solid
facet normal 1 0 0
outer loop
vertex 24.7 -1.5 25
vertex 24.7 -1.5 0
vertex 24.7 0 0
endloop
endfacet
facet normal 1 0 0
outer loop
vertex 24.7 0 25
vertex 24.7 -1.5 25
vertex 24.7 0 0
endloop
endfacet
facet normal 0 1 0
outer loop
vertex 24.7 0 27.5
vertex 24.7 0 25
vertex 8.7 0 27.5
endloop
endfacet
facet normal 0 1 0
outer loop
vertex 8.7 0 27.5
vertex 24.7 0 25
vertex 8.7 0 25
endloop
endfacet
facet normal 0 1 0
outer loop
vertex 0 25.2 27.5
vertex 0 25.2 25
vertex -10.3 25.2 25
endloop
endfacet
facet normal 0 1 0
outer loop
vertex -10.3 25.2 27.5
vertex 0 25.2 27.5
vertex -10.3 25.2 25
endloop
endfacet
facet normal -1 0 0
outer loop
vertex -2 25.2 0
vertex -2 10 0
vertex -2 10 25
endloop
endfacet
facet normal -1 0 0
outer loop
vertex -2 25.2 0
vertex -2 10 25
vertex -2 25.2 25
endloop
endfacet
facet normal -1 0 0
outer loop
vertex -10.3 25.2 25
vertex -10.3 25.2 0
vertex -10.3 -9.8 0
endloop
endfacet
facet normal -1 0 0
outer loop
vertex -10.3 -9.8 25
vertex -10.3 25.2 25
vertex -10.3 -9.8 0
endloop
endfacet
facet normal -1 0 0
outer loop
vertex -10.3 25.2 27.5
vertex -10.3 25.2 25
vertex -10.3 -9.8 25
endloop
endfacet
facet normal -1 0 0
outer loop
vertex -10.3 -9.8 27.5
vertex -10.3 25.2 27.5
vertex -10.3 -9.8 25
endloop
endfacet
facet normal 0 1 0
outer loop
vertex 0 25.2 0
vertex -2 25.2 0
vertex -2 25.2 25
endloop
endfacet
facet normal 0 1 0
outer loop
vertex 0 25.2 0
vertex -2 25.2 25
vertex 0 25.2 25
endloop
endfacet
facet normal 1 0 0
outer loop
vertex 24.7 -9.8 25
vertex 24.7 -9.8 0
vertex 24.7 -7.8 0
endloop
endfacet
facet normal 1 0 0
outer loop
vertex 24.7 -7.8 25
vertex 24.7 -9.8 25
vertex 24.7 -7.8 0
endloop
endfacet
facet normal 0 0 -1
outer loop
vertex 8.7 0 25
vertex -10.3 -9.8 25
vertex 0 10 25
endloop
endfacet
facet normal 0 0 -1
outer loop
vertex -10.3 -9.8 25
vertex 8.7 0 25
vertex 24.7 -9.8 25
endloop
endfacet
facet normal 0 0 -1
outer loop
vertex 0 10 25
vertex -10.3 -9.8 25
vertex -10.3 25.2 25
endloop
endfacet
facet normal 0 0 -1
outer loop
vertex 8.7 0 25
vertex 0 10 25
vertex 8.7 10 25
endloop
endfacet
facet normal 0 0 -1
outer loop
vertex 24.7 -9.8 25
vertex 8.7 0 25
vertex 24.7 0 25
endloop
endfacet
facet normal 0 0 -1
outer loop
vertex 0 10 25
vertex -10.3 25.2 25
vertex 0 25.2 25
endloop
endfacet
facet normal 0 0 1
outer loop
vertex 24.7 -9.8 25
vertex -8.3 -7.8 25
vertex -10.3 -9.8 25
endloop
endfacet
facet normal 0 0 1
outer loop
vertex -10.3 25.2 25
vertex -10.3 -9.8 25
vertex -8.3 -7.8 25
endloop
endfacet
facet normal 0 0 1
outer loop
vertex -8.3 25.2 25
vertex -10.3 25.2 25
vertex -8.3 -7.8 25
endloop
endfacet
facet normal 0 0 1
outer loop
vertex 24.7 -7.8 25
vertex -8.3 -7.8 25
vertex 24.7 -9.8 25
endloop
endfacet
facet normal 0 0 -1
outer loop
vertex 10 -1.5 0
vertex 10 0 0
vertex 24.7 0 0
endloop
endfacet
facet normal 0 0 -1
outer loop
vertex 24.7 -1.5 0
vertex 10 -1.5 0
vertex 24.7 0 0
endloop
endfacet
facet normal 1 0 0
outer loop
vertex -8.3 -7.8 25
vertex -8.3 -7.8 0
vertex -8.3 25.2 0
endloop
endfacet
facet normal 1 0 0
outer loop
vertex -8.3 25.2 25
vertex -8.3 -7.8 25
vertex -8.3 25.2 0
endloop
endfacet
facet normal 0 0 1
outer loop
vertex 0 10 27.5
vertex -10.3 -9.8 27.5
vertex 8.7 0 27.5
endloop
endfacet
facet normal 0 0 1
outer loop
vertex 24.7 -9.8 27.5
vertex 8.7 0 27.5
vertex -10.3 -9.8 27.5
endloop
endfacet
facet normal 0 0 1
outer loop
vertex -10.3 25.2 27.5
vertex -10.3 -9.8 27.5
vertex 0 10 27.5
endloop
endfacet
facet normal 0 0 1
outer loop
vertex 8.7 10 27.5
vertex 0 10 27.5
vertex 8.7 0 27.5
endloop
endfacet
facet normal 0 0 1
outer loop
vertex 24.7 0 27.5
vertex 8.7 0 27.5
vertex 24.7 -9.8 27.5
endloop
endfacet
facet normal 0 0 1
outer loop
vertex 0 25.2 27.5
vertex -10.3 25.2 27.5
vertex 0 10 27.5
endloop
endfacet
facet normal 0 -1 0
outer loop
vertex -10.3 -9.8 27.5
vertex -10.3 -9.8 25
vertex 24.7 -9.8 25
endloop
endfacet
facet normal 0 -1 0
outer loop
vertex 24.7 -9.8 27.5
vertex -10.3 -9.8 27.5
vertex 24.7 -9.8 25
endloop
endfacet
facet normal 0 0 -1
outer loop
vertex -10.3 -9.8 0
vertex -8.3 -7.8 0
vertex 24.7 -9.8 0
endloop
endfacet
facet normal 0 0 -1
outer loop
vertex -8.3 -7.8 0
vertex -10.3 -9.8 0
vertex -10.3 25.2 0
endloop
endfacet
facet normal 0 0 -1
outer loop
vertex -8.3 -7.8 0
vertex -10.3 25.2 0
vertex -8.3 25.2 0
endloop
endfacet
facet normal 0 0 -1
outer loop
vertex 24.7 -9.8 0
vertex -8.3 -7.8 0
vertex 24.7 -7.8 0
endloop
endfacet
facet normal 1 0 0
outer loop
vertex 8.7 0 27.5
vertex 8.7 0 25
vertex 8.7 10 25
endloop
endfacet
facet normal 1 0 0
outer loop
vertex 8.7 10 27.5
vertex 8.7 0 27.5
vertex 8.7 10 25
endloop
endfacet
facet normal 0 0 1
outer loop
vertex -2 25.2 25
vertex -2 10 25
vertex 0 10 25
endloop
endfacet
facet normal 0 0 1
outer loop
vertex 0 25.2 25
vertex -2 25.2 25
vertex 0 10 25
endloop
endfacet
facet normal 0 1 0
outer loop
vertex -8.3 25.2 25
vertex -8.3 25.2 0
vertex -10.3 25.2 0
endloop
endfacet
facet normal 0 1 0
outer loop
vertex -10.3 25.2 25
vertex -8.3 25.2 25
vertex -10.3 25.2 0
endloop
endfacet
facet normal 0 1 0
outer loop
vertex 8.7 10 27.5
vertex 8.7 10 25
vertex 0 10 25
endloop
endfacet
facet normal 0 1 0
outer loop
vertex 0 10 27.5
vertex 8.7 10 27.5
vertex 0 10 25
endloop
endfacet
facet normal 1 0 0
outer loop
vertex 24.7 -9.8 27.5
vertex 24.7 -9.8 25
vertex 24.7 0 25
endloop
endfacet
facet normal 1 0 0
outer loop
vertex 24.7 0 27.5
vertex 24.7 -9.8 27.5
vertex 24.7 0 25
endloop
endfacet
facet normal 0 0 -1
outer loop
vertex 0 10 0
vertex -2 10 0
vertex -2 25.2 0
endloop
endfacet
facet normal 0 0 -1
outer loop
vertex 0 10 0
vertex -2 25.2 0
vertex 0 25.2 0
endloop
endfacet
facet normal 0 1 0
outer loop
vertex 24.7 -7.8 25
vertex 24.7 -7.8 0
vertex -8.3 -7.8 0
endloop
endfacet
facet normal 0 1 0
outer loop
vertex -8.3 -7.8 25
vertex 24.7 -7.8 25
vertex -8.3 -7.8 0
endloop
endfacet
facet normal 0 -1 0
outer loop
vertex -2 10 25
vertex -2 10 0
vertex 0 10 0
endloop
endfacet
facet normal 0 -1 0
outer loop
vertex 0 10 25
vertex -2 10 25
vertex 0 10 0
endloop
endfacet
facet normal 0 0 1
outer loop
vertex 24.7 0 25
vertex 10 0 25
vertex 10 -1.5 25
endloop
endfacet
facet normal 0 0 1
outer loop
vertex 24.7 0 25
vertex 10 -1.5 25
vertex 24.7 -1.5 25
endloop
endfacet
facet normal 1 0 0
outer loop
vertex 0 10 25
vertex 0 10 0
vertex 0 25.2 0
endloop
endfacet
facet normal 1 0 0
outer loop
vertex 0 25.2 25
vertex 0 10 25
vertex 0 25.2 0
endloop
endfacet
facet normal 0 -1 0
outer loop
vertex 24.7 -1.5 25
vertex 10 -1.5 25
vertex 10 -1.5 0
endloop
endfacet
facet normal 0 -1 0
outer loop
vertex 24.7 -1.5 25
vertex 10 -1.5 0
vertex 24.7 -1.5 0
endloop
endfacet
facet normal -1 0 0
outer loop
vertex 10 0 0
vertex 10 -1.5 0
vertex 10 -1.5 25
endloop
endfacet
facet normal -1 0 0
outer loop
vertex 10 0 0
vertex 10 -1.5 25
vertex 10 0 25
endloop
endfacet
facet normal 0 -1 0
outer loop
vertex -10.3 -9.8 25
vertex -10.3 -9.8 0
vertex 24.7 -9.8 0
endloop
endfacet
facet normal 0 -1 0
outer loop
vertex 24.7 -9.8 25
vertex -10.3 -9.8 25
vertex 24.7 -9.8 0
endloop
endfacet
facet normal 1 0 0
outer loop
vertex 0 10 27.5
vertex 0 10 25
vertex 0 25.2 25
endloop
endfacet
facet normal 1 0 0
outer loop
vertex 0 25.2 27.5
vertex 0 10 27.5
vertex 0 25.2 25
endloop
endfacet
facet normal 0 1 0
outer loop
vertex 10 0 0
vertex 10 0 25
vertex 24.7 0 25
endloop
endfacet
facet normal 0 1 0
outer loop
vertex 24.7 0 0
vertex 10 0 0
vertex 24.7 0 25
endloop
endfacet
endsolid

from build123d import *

# Parameters (mm, degrees)
F0_W     = 14.7
F0_H     = 1.5
F0_W_2   = 2
F0_H_2   = 15.2
F1_DEPTH = 25
F3_DEPTH = 2.5


with BuildPart() as f1:
    # F0 (on Top) → F1 (new body)
    with BuildSketch(Plane.XY):
        Polygon((-8.3, 25.2), (-10.3, 25.2), (-10.3, -9.8), (24.7, -9.8), (24.7, -7.8), (-8.3, -7.8), align=None)
        with Locations((17.35, -0.75)):
            Rectangle(F0_W, F0_H)
        with Locations((-1, 17.6)):
            Rectangle(F0_W_2, F0_H_2)
    extrude(amount=F1_DEPTH)


with BuildPart() as f3:
    # F2 (on face) → F3 (new body)
    with BuildSketch(Plane.XY.offset(25)):
        Polygon((0, 25.2), (-10.3, 25.2), (-10.3, -9.8), (24.7, -9.8), (24.7, 0), (8.7, 0), (8.7, 10), (0, 10), align=None)
    extrude(amount=F3_DEPTH)


solid = Compound([f1.part, f3.part])
